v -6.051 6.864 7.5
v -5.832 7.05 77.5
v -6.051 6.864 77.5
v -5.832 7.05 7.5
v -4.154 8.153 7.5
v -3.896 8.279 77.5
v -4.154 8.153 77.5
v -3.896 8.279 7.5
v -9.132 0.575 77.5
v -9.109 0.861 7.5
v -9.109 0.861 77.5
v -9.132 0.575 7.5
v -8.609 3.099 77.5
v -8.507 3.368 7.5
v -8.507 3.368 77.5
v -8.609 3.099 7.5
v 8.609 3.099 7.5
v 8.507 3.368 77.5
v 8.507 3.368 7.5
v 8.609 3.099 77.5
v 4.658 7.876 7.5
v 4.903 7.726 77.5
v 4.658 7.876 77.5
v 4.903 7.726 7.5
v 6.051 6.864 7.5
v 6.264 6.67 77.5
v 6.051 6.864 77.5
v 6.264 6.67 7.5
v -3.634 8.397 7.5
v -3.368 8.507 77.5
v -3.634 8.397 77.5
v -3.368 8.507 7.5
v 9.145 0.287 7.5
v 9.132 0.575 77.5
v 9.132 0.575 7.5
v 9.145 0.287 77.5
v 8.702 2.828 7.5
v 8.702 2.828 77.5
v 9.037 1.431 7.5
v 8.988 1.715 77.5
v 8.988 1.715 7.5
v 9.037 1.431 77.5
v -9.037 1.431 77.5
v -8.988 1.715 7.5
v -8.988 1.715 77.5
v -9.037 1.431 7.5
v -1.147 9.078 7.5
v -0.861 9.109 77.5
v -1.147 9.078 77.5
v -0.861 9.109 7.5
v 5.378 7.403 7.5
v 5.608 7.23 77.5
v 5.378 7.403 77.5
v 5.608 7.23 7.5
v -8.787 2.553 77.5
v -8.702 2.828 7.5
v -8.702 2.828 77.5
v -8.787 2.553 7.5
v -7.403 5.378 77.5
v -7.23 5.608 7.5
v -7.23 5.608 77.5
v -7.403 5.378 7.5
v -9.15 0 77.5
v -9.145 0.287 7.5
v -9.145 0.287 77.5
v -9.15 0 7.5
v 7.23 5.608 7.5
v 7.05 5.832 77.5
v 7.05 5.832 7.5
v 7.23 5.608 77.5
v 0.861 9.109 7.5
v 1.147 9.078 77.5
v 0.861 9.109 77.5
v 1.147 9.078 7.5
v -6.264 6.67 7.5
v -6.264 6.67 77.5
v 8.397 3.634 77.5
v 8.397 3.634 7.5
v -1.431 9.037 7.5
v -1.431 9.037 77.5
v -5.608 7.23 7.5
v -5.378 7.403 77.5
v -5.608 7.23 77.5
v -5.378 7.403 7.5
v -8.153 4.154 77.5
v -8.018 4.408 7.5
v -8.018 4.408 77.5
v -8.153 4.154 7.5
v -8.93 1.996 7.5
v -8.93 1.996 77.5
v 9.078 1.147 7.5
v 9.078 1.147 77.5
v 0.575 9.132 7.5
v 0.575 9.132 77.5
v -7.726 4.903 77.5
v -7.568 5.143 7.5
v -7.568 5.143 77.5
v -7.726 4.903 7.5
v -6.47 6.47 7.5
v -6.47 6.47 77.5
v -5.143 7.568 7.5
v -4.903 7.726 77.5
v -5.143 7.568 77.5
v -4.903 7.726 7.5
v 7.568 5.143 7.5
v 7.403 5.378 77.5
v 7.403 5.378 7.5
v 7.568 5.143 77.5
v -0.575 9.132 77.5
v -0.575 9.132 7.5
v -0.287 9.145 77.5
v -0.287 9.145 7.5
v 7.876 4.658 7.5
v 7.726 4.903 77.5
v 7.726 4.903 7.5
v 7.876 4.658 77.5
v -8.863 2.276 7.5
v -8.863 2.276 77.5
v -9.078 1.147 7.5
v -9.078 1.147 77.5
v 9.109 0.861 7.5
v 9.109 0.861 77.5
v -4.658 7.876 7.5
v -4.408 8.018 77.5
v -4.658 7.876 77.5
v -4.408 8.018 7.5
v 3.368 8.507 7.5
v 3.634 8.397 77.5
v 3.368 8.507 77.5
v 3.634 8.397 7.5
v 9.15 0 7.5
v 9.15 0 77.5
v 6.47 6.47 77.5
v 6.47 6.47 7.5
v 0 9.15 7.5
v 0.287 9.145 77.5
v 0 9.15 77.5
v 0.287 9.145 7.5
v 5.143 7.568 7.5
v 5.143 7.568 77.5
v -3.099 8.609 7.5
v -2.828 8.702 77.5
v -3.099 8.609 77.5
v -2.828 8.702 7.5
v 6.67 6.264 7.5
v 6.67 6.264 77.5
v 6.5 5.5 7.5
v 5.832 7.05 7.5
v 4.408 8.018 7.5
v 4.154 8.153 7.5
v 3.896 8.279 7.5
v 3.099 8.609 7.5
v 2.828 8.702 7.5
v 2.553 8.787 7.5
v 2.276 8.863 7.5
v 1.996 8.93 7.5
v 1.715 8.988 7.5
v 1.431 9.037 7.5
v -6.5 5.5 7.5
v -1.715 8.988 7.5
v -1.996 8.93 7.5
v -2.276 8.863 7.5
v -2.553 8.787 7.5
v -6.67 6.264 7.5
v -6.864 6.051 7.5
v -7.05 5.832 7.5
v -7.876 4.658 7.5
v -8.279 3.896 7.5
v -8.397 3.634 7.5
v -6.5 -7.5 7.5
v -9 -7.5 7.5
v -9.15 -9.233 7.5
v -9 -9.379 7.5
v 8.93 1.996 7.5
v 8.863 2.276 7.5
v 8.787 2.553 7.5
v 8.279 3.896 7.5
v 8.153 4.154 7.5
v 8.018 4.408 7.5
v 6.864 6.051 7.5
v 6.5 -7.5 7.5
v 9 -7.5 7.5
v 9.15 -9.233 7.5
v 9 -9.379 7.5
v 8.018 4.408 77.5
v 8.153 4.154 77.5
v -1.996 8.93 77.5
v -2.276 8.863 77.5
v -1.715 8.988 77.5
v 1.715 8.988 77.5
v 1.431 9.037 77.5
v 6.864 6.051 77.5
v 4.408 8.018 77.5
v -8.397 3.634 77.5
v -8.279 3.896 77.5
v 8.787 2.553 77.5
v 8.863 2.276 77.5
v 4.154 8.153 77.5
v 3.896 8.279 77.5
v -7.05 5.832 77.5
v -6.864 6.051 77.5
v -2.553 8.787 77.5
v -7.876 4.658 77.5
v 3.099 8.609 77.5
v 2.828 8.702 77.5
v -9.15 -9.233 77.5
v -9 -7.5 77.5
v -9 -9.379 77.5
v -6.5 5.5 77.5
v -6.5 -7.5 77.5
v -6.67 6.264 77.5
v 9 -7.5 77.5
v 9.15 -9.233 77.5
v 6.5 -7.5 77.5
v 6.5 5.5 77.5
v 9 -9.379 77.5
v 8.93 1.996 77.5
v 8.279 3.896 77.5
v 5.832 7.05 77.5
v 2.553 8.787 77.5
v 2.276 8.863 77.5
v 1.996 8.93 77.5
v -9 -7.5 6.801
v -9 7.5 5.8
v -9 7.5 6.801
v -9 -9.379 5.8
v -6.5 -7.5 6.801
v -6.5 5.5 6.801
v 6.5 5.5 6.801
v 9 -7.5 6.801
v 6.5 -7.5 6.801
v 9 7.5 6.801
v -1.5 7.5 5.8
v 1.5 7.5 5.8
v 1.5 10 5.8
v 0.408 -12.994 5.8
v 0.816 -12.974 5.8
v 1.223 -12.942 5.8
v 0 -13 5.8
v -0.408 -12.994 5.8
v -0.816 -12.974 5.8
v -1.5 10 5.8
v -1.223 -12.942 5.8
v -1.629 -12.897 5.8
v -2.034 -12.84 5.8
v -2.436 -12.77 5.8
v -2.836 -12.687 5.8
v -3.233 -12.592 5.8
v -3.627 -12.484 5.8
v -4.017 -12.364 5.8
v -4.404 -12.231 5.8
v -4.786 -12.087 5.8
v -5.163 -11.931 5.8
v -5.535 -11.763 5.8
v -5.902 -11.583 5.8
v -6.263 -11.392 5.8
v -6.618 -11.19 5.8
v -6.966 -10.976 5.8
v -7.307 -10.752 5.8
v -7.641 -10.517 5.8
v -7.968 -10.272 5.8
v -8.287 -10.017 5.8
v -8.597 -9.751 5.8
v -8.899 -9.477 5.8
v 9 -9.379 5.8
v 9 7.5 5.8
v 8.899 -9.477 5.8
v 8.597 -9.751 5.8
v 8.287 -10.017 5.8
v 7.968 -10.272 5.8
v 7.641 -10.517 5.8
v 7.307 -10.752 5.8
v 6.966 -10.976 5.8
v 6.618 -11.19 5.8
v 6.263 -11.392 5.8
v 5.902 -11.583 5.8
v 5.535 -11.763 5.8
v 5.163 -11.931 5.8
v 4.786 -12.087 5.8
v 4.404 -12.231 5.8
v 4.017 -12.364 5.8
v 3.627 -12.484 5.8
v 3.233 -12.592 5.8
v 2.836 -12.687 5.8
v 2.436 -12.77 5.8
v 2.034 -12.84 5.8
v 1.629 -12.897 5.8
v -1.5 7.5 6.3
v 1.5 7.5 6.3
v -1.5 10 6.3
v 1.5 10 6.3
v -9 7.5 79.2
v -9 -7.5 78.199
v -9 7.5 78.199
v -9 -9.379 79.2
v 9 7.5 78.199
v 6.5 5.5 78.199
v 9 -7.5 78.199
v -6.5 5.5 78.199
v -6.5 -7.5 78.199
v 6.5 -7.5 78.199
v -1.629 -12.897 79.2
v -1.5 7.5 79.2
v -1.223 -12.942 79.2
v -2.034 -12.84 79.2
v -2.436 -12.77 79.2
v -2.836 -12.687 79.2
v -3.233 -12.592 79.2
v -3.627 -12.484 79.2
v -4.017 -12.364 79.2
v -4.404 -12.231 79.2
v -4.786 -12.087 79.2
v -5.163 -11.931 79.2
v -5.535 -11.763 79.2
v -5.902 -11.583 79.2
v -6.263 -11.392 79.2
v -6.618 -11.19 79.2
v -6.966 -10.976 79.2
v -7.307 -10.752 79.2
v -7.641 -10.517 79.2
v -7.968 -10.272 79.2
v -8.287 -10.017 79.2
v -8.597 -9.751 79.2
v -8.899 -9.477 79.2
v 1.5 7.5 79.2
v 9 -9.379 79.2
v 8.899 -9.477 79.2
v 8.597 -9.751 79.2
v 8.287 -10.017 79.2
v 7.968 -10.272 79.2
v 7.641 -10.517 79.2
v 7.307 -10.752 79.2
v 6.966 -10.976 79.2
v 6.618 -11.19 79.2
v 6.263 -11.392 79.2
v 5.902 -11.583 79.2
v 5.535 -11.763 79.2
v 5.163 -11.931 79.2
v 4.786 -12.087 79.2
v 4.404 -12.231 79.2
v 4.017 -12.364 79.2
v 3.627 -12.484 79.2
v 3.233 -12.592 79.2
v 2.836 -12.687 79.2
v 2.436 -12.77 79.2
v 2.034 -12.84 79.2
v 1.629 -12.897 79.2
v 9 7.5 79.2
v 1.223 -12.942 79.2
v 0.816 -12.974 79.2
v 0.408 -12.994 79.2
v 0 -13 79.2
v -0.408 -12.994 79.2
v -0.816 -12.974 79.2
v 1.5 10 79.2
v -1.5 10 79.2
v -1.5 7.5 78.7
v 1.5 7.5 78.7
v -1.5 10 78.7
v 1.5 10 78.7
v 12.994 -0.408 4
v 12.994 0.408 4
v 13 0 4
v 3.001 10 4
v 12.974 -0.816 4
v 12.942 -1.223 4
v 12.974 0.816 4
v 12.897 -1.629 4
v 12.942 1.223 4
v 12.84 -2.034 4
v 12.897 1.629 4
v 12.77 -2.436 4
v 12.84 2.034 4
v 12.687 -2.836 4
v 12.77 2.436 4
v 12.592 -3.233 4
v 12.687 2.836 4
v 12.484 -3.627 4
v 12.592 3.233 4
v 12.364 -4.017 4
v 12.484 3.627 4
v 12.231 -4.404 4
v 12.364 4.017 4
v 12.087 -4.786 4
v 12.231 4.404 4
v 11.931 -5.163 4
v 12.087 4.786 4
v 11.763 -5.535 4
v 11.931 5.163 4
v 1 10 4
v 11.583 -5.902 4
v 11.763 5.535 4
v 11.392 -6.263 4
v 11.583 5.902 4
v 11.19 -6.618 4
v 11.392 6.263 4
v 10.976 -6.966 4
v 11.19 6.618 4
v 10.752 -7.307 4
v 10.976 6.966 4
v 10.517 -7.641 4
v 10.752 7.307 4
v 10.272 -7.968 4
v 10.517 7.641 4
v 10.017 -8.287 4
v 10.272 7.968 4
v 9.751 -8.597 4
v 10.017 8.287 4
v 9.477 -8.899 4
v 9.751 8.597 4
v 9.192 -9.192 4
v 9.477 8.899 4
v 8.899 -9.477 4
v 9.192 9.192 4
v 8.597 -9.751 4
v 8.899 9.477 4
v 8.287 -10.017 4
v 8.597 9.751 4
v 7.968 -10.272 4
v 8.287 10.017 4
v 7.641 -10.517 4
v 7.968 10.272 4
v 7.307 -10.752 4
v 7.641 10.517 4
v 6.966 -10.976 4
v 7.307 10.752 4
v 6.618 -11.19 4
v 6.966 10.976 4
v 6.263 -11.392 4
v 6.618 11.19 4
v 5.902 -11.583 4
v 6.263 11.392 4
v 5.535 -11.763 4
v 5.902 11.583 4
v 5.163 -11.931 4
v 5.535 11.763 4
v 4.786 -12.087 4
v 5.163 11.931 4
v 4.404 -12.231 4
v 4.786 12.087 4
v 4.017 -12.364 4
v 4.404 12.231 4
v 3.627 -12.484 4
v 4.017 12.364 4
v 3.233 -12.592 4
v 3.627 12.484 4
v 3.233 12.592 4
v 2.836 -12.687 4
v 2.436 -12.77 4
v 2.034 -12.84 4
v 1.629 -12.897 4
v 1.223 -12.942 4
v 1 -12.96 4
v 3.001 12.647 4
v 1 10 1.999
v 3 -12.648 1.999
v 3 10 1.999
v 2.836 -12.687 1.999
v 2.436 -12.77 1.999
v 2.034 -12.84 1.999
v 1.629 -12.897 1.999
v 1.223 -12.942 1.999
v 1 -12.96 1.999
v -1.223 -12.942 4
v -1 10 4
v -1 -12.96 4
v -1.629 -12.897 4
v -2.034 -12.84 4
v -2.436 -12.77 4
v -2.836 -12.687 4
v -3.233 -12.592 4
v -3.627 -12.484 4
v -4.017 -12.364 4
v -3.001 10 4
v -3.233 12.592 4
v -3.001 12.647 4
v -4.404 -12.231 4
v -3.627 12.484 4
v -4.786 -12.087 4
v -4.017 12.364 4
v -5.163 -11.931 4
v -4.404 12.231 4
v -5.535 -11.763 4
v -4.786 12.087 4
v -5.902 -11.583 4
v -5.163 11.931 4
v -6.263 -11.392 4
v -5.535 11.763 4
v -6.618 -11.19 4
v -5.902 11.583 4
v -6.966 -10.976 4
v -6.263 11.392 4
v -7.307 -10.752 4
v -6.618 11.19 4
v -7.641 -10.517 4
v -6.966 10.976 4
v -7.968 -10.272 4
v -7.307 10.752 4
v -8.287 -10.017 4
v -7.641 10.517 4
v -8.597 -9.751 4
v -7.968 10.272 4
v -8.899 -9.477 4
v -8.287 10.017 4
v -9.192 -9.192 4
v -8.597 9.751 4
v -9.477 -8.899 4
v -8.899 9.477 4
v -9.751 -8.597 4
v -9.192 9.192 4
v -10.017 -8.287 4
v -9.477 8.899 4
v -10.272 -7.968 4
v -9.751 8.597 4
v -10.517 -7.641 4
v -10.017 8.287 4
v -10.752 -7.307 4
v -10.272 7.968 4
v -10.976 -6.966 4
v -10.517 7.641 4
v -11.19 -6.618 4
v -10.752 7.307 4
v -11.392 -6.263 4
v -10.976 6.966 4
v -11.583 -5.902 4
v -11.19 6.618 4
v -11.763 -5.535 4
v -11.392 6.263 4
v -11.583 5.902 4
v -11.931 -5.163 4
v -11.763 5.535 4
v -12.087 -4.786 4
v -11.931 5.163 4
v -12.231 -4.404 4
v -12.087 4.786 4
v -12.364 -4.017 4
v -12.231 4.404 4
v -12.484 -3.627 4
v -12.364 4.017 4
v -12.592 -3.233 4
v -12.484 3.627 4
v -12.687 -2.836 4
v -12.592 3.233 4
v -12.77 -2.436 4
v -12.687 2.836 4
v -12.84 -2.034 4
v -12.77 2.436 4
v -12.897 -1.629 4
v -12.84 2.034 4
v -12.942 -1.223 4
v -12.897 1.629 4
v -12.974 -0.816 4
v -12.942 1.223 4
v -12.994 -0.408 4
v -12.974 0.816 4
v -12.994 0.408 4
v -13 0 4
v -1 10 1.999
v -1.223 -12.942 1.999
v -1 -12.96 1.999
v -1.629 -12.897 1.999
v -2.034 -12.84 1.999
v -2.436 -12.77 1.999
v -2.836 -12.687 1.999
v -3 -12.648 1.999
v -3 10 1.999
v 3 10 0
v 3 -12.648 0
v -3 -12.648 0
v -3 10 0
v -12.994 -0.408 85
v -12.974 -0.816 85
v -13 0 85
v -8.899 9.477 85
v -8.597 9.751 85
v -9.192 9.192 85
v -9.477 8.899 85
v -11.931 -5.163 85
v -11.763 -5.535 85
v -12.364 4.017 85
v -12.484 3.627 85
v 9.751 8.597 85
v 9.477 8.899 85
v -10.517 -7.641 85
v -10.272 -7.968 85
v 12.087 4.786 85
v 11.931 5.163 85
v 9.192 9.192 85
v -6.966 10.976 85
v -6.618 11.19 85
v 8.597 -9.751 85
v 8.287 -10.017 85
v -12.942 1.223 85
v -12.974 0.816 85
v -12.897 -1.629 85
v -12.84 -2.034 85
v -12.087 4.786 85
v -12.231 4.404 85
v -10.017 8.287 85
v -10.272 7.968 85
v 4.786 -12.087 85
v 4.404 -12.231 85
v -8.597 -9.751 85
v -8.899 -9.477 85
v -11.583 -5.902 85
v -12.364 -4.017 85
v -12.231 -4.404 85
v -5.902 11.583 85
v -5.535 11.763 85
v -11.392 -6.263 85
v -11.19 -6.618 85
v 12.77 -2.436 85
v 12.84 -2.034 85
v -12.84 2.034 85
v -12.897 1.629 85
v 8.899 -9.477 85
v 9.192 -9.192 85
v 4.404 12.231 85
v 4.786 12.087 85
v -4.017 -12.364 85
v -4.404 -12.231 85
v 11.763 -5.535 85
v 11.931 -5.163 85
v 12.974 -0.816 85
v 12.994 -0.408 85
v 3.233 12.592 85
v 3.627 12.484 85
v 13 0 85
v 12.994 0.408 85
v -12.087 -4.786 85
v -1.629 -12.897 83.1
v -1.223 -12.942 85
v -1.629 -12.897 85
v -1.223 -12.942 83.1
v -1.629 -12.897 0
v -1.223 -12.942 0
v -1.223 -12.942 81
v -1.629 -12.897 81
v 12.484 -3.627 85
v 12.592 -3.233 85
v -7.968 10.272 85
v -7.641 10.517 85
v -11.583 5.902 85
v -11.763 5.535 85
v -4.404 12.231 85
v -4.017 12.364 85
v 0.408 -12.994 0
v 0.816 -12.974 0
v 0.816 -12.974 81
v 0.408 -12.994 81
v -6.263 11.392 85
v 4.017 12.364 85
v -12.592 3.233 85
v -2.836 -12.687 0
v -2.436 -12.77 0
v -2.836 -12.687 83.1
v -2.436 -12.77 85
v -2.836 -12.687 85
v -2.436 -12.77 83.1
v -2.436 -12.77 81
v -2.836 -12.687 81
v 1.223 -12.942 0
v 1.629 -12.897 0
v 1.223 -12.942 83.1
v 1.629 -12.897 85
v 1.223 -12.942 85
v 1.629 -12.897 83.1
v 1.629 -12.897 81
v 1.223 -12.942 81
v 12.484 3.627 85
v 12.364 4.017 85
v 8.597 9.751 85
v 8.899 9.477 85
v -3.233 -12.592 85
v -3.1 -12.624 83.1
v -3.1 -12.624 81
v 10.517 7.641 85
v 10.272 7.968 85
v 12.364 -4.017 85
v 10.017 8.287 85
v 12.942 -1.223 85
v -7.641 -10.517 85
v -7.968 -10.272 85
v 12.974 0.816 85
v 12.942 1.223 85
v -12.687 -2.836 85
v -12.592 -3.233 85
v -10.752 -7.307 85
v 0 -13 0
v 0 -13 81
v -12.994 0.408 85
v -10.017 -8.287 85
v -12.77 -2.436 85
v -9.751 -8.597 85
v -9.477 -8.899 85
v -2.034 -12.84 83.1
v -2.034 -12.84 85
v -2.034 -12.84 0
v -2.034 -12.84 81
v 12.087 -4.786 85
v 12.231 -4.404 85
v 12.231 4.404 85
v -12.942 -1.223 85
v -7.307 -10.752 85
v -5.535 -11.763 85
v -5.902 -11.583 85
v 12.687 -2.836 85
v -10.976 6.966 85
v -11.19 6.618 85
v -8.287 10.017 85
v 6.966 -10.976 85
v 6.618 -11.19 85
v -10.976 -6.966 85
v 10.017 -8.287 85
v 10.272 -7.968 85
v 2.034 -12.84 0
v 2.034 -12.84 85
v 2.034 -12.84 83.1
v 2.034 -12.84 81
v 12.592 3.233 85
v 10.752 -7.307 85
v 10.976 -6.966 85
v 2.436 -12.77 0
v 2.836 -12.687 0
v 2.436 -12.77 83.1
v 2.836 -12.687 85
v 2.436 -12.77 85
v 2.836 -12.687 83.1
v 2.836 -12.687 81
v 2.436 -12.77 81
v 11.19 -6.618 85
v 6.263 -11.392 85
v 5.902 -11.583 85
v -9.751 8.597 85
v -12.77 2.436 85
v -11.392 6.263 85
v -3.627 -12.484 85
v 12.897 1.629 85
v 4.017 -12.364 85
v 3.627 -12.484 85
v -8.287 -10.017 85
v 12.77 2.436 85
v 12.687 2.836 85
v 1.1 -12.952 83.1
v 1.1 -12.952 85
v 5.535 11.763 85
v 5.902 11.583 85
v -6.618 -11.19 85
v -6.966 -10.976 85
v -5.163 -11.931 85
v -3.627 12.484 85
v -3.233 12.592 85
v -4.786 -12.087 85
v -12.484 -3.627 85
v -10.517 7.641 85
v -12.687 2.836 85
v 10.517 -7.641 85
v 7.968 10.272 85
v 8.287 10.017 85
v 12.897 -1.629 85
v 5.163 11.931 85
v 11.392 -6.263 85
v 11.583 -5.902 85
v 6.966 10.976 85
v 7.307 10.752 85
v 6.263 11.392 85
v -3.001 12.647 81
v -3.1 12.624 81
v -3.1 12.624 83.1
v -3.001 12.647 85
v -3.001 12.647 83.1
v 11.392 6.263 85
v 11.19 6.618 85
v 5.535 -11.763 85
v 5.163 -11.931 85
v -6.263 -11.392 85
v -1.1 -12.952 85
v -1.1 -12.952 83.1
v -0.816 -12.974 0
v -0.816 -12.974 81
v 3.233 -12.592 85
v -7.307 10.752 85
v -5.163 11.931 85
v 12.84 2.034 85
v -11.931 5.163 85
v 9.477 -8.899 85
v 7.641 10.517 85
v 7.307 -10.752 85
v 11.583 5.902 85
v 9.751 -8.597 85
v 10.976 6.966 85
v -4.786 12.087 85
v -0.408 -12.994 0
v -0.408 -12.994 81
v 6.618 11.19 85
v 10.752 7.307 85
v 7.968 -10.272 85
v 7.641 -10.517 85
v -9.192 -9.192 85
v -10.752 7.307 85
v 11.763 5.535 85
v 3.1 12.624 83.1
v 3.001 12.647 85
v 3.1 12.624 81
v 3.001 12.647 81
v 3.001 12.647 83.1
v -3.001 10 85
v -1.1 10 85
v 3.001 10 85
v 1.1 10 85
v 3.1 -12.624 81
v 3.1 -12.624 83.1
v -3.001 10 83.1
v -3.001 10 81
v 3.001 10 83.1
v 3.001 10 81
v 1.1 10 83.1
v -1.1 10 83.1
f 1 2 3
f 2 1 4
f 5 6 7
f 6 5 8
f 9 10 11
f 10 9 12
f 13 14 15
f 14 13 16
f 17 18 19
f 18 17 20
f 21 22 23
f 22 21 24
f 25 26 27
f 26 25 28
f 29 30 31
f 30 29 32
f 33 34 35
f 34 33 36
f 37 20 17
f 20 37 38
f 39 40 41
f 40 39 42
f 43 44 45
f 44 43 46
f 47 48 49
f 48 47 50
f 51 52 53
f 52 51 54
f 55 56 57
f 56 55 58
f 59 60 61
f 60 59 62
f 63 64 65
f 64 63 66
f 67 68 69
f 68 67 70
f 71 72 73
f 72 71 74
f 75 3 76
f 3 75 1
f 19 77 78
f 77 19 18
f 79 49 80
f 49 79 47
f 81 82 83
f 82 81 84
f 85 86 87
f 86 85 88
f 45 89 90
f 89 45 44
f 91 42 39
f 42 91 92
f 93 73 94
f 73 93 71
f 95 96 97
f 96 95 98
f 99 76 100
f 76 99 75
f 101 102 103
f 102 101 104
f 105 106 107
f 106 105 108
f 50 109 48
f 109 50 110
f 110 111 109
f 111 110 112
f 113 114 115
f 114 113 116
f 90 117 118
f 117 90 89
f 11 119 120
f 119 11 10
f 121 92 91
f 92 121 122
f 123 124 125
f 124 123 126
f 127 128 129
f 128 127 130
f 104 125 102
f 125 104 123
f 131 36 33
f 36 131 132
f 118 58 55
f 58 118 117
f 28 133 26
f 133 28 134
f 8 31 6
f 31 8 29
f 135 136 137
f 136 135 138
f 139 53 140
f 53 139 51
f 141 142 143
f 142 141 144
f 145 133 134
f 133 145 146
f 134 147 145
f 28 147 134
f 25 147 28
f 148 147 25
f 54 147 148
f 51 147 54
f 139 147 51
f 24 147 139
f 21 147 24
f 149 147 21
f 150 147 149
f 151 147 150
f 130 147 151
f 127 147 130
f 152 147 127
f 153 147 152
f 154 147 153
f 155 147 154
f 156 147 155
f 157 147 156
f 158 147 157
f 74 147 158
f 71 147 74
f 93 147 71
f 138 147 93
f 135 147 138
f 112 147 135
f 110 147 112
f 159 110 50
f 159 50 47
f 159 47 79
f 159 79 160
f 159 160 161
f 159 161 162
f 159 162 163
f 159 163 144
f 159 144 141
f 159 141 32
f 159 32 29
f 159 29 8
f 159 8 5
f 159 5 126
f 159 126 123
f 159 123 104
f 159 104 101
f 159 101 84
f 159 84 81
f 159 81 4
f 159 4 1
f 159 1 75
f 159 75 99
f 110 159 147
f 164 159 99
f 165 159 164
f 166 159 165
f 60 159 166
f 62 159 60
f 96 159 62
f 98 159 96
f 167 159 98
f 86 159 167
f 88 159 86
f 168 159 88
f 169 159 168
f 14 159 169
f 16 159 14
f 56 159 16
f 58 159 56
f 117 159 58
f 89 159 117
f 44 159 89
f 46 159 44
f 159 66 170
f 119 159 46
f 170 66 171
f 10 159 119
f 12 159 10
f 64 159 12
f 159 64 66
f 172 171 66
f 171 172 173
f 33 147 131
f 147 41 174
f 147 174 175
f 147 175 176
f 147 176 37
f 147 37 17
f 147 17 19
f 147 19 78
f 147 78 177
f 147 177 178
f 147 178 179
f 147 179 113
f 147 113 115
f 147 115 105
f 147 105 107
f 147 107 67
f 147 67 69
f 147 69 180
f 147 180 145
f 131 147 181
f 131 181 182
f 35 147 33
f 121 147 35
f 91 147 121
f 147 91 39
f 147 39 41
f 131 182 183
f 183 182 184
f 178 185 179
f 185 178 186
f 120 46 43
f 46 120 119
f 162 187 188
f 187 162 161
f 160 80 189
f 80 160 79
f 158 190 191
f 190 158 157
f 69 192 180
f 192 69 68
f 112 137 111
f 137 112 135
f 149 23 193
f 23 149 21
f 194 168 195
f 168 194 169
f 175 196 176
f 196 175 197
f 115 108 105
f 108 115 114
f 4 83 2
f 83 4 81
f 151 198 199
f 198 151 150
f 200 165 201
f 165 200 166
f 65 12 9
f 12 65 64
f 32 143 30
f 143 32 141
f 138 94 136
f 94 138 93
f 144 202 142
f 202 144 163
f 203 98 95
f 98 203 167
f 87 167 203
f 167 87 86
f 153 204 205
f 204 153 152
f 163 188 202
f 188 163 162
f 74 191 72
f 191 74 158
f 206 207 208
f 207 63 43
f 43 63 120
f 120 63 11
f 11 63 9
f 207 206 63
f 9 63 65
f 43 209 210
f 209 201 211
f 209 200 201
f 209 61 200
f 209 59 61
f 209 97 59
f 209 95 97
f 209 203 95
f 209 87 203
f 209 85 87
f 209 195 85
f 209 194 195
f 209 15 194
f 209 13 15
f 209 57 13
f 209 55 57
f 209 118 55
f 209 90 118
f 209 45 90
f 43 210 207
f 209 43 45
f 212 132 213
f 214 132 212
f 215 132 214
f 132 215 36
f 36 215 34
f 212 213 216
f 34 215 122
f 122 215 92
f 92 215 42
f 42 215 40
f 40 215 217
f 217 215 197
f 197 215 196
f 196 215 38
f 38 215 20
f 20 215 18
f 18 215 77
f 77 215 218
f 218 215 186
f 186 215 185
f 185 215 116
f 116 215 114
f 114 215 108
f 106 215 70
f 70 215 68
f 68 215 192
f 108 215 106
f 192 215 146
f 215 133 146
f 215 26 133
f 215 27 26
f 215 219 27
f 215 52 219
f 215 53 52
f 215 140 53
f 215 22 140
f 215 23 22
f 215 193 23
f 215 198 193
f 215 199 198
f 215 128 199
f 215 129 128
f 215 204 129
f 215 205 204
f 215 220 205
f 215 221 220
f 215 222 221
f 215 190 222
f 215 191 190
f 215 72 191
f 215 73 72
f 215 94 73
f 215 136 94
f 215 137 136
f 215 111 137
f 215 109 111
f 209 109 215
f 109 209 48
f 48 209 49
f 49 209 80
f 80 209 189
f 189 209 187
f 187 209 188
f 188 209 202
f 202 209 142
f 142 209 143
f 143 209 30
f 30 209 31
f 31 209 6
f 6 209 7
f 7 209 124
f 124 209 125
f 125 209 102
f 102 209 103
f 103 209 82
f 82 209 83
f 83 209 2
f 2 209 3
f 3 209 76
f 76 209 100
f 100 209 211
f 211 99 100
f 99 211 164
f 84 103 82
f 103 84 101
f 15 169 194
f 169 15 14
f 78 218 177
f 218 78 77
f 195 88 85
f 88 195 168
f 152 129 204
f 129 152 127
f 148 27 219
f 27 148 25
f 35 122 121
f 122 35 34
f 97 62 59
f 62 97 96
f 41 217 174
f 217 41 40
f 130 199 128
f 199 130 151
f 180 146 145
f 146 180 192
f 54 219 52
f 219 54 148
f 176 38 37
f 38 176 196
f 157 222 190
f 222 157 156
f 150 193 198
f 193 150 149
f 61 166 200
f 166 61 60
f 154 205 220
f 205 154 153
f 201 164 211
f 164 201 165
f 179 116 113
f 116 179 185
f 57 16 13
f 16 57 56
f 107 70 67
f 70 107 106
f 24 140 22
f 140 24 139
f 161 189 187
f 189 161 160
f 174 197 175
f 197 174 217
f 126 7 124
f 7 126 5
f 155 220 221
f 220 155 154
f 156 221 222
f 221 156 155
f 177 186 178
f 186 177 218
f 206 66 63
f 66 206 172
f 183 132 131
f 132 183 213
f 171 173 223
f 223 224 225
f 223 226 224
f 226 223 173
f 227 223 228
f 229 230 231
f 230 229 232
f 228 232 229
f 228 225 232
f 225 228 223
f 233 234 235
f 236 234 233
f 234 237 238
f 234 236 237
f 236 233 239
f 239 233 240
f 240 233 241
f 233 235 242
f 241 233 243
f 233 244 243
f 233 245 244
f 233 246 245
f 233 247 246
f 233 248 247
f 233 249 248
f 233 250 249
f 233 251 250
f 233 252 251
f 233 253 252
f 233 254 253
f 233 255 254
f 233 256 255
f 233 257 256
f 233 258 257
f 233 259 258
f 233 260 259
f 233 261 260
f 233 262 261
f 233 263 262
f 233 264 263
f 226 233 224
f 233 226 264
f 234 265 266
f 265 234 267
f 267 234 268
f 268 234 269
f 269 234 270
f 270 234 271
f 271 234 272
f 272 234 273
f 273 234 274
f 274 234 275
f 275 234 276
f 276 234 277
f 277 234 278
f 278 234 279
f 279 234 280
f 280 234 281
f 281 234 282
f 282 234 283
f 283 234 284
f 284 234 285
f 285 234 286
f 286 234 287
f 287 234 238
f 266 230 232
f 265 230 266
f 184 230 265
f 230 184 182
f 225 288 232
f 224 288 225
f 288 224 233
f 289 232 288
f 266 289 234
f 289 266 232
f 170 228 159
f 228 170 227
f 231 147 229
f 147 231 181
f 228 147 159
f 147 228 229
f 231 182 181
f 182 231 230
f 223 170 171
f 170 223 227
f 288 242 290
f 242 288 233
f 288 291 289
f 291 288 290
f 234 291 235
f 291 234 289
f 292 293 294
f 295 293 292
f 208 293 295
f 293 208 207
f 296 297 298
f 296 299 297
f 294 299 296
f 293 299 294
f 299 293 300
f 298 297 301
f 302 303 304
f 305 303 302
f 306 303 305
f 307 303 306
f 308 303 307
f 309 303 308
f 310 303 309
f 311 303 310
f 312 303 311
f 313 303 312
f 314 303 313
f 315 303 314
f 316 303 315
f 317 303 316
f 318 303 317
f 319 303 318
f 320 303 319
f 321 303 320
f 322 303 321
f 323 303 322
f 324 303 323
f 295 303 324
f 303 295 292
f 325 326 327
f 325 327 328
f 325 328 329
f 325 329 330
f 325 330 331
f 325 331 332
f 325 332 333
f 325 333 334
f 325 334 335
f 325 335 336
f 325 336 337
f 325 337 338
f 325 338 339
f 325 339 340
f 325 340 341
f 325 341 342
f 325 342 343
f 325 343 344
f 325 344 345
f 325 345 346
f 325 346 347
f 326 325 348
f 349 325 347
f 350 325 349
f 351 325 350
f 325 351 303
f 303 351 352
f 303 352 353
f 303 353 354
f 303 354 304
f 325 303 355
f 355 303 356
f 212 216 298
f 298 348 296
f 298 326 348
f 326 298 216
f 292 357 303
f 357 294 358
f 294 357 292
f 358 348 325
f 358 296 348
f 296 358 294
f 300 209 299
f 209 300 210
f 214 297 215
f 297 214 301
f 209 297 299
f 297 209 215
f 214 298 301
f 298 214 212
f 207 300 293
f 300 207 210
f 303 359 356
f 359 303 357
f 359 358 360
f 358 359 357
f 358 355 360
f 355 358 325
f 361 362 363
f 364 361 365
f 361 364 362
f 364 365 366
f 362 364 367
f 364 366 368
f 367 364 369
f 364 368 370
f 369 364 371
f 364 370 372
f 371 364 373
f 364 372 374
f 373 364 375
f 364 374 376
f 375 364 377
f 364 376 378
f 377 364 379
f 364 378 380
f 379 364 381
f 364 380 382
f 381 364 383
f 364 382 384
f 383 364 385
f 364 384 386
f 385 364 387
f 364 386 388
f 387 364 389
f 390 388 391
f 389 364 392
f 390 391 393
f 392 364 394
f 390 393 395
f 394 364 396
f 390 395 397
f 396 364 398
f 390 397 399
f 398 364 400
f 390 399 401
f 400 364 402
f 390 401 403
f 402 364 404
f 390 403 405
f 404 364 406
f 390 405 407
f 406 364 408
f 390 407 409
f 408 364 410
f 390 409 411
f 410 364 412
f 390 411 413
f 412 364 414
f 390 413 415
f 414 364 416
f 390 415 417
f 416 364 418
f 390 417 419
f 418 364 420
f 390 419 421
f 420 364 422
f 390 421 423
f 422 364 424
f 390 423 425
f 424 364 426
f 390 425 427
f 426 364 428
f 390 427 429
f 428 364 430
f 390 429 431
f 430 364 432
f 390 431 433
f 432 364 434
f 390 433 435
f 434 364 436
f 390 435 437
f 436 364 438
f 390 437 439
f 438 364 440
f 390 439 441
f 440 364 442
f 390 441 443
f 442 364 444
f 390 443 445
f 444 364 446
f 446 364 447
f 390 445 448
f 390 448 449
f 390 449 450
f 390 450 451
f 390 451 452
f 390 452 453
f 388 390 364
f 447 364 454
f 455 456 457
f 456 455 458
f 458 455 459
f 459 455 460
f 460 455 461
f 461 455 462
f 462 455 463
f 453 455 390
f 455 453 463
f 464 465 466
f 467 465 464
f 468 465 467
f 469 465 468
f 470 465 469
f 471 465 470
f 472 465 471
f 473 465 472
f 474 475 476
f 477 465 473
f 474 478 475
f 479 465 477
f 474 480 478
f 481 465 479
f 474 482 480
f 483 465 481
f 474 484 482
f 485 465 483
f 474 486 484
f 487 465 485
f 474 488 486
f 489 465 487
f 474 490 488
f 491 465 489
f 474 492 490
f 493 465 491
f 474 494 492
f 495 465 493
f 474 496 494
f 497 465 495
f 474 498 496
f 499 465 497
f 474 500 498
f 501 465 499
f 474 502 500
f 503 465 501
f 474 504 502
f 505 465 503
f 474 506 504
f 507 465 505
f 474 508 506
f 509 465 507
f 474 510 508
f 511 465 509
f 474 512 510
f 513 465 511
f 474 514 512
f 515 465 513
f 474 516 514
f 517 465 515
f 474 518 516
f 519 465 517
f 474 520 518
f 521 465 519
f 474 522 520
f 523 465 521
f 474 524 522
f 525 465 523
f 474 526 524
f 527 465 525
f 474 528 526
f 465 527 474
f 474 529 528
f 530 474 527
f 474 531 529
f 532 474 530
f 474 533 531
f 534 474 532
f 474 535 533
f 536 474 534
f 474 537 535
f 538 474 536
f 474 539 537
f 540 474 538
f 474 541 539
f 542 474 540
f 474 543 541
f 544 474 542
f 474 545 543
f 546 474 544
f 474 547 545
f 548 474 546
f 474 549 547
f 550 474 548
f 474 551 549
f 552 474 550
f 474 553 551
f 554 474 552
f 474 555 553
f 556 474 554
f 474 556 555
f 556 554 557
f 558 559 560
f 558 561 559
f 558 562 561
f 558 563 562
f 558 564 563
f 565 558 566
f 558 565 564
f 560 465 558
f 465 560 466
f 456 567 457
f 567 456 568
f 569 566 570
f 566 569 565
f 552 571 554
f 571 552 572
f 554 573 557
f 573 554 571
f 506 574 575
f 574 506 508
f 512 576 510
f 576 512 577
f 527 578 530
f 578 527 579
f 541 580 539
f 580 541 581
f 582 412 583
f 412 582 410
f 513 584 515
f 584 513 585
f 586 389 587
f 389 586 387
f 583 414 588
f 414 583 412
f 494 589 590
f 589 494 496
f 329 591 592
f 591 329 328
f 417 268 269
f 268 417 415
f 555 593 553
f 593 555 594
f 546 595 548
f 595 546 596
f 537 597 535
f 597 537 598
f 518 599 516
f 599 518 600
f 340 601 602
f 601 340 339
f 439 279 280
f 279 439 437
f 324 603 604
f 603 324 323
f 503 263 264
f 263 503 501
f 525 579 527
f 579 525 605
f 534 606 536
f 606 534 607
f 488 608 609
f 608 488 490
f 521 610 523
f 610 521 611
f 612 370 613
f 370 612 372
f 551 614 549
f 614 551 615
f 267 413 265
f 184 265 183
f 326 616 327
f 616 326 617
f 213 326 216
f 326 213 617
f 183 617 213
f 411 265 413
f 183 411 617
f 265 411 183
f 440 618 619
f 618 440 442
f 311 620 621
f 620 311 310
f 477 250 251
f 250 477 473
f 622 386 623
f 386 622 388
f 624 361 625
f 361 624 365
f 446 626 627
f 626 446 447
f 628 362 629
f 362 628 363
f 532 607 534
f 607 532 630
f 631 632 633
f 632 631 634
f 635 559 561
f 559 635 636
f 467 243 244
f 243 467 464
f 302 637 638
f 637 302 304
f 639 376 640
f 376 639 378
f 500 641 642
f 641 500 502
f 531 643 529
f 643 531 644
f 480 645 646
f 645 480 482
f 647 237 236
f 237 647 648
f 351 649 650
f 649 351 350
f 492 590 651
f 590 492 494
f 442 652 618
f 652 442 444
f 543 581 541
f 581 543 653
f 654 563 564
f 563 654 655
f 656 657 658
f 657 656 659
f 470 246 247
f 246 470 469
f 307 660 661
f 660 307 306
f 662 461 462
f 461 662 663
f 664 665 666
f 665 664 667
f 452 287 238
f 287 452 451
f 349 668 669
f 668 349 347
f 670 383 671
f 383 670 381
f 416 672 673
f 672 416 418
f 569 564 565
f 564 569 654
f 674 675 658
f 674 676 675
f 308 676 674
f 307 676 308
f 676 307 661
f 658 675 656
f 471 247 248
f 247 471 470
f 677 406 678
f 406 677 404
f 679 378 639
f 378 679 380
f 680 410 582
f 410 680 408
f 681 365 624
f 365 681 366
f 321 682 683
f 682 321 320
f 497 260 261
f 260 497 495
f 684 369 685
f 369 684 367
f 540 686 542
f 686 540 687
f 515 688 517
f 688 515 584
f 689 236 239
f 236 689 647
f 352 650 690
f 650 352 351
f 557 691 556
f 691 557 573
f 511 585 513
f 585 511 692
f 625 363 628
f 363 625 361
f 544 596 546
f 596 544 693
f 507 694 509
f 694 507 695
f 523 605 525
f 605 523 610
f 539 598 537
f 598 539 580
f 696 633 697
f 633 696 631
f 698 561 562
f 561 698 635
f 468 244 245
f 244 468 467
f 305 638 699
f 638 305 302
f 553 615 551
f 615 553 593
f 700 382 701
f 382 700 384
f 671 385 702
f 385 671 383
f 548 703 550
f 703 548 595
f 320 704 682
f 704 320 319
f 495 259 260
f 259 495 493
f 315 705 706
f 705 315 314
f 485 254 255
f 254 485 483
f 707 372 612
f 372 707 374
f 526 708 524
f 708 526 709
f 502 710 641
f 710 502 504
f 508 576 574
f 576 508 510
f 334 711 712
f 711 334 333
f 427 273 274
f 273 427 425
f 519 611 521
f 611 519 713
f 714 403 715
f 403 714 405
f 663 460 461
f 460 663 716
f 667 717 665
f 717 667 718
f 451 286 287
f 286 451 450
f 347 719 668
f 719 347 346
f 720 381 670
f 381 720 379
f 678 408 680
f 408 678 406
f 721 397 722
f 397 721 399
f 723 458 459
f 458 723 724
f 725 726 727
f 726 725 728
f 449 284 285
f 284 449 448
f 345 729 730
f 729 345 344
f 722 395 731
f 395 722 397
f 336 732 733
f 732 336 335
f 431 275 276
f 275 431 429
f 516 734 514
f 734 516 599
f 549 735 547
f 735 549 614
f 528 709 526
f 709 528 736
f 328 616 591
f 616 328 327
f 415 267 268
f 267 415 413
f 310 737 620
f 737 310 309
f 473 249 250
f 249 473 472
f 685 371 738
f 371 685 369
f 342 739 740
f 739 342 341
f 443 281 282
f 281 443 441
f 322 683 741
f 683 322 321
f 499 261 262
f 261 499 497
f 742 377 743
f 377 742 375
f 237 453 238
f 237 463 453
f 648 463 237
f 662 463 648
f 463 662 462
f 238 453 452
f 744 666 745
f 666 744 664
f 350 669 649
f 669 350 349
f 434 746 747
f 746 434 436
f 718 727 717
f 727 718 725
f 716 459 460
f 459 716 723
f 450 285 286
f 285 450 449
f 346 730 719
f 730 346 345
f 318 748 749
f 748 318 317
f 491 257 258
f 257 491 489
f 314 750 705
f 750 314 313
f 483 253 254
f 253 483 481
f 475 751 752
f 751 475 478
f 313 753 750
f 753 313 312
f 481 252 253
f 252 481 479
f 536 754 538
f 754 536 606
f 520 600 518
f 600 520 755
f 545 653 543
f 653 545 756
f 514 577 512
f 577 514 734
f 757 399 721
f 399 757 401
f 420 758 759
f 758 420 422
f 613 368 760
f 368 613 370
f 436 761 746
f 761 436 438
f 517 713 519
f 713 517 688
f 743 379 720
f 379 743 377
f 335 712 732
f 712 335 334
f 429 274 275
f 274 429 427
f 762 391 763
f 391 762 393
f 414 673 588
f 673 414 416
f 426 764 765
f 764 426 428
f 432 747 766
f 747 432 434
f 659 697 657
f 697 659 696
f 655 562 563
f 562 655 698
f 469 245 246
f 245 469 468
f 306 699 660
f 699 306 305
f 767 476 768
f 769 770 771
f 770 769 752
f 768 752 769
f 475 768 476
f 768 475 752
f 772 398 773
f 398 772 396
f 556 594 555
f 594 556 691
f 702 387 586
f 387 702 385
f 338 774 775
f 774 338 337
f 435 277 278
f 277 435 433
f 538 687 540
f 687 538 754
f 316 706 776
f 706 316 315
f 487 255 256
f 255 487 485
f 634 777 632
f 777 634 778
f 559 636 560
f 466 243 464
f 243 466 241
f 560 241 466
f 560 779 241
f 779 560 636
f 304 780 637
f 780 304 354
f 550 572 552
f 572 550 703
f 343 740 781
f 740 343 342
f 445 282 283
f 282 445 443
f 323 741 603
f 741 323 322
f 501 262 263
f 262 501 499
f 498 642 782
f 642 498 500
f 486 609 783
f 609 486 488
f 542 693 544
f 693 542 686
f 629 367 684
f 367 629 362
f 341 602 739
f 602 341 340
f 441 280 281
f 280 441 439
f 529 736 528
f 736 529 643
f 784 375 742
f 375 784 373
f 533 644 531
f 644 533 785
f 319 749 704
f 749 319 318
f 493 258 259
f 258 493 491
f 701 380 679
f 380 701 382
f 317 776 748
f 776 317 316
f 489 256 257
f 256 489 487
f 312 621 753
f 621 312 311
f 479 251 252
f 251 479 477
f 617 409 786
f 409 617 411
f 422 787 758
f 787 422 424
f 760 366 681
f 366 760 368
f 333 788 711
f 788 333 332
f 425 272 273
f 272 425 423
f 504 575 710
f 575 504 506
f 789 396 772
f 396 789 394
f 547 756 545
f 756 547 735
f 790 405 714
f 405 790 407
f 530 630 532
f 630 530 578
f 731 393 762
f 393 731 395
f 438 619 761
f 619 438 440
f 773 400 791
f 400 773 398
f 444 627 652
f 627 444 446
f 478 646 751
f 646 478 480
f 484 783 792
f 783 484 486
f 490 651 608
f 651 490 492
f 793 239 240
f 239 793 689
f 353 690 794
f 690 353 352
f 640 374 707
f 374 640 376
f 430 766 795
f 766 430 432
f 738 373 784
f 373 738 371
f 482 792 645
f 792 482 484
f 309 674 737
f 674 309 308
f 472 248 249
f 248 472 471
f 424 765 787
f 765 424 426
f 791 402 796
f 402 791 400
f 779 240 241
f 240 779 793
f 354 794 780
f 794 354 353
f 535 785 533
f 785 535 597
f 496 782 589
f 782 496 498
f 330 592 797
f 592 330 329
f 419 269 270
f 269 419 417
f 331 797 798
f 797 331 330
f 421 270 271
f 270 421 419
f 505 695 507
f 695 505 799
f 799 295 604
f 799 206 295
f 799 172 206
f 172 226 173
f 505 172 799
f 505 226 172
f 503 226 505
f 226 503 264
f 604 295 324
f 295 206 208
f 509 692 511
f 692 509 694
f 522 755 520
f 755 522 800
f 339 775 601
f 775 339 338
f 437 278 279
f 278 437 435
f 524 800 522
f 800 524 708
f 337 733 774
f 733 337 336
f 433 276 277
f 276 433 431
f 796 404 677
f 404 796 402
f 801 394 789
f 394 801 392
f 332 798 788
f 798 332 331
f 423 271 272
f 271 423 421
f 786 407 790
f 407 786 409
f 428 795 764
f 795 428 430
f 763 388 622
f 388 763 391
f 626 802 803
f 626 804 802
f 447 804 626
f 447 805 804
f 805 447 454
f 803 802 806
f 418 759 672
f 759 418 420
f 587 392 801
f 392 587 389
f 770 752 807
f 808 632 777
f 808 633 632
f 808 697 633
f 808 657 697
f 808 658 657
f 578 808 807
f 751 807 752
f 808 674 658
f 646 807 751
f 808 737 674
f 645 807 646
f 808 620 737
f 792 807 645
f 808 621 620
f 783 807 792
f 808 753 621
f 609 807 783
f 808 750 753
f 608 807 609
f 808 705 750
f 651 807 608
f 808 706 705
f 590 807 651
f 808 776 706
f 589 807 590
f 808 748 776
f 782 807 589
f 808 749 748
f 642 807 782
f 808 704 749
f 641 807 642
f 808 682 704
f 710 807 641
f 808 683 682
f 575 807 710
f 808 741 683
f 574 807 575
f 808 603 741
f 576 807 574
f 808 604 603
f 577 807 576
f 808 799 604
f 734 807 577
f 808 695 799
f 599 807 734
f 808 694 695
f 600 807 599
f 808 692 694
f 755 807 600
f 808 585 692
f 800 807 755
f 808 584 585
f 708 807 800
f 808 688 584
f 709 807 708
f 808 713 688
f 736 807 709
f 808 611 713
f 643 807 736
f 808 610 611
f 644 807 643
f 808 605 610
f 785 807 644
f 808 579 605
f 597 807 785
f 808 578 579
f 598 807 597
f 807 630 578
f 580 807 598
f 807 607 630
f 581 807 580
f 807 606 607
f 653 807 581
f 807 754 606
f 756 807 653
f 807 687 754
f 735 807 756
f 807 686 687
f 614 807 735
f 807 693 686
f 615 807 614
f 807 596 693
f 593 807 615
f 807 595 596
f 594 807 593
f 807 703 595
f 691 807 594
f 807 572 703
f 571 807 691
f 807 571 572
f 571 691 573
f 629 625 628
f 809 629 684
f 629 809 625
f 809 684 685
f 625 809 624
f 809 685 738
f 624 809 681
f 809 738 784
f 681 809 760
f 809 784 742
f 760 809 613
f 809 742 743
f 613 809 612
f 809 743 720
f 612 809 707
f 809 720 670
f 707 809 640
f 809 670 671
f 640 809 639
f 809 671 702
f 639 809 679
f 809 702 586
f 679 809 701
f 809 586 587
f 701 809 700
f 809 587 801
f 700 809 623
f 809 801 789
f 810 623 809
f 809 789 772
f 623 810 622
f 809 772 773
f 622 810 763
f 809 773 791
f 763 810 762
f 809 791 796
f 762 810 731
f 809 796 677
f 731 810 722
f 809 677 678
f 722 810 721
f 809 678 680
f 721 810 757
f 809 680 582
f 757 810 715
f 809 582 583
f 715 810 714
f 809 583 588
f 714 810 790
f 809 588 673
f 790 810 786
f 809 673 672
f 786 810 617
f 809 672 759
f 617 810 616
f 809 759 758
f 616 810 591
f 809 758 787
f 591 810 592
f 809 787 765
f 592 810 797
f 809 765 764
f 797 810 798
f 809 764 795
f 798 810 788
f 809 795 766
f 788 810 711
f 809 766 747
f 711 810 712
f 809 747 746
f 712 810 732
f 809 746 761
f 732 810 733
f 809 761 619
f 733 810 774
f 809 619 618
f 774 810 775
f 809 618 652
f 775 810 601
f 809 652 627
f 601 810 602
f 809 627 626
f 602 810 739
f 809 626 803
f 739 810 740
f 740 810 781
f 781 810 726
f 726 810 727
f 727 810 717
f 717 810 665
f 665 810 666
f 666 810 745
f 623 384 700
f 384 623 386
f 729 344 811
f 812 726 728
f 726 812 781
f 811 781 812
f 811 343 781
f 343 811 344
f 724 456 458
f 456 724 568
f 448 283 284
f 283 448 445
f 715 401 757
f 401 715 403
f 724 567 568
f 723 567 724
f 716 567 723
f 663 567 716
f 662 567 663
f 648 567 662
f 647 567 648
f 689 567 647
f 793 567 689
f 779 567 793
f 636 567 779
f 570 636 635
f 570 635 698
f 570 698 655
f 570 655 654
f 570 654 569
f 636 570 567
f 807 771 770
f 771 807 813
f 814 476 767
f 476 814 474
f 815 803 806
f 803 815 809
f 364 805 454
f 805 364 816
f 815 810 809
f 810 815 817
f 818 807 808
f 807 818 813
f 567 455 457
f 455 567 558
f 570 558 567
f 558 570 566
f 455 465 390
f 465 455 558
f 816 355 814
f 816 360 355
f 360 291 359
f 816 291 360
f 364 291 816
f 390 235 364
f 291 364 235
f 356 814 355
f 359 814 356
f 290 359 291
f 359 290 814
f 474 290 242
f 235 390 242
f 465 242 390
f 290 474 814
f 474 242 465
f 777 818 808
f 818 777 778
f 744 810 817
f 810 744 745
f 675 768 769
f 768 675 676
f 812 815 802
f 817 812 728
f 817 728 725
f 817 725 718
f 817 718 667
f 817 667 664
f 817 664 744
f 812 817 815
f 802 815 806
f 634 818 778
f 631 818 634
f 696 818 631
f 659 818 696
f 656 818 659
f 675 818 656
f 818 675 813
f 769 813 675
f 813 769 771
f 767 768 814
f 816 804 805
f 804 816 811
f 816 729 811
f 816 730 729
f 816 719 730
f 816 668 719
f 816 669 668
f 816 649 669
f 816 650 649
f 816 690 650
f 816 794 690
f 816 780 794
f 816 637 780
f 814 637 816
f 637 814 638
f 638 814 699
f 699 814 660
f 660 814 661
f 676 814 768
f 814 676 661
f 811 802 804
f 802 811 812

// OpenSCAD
//Resolution
RES = 200; // [100:Rough,200:Medium,400:Great, 5000:Bananas]
fn = RES;
// EPSilon (for previewing)
EPS = .001;
// 18650 diameter
18650_D = 18.3;
// 18650 height
18650_H = 65;
SPRING_H = 5;
// Unit outer diameter
OD = 26;
// Unit height
H = 85;
// Groove dimensions (Width, Depth)
GROOVE = [6, 3];
// Spring plate size (Width, Depth, Thickness)
SPRING = [18, 15, .5];

module spring_pad() {
	translate([-SPRING[0] / 2, -SPRING[1] / 2, (H - 18650_H - SPRING_H) / 2 - 1 - .7]) {
		cube([SPRING[0], SPRING[1] + OD / 2 - SPRING[1] / 2, 1 + EPS]);
		translate([2.5, 2, 1]) cube([SPRING[0] - 5, SPRING[1] - 2 + OD / 2 - SPRING[1] / 2, .7 + EPS]);
		translate([0, SPRING[1], 1]) cube([SPRING[0], (OD - SPRING[1]) / 2, .7 + EPS]);
		translate([(SPRING[0] - 3) / 2, -(OD - SPRING[1]) / 2, 0]) cube([3, (OD - SPRING[1]) / 2 + EPS, SPRING[2]]);
	}
}

rotate(a = 180, v = [0, 0, 1]) difference() {
	cylinder(r = OD / 2, h = H, $fn = fn);
	translate([0, 0, (H - 18650_H - SPRING_H) / 2]) union() {
		cylinder(r = 18650_D / 2, h = 18650_H + SPRING_H, $fn = fn);
		translate([-18650_D / 2, 0, 0]) cube([18650_D, OD / 2, 18650_H + SPRING_H]);
	}
	translate([-GROOVE[0] / 2 - EPS, -OD / 2, -EPS]) cube([GROOVE[0] + EPS * 2, GROOVE[1], H + EPS * 2]);
	spring_pad();
	translate([0, 0, H]) mirror([0, 0, 1]) spring_pad();
	rotate(a = 90, v = [0, 0, 1]) {
		translate([-OD / 2, 1, 2 - EPS]) cube([OD, (OD - 2) / 2, 2 + EPS]);
		translate([-OD / 2, -OD / 2, 2 - EPS]) cube([OD, (OD - 2) / 2, 2 + EPS]);
		translate([-OD / 2, 3, 0 - EPS]) cube([OD, (OD - 6) / 2, 2 + EPS]);
		translate([-OD / 2, -OD / 2, 0 - EPS]) cube([OD, (OD - 6) / 2, 2 + EPS]);
	}
	translate([-1.1, -OD / 2, H - 2]) cube([2.2, OD, 2 + EPS]);
	translate([-3.1, -OD / 2, H - 4]) cube([6.2, OD, 2.1]);
}
